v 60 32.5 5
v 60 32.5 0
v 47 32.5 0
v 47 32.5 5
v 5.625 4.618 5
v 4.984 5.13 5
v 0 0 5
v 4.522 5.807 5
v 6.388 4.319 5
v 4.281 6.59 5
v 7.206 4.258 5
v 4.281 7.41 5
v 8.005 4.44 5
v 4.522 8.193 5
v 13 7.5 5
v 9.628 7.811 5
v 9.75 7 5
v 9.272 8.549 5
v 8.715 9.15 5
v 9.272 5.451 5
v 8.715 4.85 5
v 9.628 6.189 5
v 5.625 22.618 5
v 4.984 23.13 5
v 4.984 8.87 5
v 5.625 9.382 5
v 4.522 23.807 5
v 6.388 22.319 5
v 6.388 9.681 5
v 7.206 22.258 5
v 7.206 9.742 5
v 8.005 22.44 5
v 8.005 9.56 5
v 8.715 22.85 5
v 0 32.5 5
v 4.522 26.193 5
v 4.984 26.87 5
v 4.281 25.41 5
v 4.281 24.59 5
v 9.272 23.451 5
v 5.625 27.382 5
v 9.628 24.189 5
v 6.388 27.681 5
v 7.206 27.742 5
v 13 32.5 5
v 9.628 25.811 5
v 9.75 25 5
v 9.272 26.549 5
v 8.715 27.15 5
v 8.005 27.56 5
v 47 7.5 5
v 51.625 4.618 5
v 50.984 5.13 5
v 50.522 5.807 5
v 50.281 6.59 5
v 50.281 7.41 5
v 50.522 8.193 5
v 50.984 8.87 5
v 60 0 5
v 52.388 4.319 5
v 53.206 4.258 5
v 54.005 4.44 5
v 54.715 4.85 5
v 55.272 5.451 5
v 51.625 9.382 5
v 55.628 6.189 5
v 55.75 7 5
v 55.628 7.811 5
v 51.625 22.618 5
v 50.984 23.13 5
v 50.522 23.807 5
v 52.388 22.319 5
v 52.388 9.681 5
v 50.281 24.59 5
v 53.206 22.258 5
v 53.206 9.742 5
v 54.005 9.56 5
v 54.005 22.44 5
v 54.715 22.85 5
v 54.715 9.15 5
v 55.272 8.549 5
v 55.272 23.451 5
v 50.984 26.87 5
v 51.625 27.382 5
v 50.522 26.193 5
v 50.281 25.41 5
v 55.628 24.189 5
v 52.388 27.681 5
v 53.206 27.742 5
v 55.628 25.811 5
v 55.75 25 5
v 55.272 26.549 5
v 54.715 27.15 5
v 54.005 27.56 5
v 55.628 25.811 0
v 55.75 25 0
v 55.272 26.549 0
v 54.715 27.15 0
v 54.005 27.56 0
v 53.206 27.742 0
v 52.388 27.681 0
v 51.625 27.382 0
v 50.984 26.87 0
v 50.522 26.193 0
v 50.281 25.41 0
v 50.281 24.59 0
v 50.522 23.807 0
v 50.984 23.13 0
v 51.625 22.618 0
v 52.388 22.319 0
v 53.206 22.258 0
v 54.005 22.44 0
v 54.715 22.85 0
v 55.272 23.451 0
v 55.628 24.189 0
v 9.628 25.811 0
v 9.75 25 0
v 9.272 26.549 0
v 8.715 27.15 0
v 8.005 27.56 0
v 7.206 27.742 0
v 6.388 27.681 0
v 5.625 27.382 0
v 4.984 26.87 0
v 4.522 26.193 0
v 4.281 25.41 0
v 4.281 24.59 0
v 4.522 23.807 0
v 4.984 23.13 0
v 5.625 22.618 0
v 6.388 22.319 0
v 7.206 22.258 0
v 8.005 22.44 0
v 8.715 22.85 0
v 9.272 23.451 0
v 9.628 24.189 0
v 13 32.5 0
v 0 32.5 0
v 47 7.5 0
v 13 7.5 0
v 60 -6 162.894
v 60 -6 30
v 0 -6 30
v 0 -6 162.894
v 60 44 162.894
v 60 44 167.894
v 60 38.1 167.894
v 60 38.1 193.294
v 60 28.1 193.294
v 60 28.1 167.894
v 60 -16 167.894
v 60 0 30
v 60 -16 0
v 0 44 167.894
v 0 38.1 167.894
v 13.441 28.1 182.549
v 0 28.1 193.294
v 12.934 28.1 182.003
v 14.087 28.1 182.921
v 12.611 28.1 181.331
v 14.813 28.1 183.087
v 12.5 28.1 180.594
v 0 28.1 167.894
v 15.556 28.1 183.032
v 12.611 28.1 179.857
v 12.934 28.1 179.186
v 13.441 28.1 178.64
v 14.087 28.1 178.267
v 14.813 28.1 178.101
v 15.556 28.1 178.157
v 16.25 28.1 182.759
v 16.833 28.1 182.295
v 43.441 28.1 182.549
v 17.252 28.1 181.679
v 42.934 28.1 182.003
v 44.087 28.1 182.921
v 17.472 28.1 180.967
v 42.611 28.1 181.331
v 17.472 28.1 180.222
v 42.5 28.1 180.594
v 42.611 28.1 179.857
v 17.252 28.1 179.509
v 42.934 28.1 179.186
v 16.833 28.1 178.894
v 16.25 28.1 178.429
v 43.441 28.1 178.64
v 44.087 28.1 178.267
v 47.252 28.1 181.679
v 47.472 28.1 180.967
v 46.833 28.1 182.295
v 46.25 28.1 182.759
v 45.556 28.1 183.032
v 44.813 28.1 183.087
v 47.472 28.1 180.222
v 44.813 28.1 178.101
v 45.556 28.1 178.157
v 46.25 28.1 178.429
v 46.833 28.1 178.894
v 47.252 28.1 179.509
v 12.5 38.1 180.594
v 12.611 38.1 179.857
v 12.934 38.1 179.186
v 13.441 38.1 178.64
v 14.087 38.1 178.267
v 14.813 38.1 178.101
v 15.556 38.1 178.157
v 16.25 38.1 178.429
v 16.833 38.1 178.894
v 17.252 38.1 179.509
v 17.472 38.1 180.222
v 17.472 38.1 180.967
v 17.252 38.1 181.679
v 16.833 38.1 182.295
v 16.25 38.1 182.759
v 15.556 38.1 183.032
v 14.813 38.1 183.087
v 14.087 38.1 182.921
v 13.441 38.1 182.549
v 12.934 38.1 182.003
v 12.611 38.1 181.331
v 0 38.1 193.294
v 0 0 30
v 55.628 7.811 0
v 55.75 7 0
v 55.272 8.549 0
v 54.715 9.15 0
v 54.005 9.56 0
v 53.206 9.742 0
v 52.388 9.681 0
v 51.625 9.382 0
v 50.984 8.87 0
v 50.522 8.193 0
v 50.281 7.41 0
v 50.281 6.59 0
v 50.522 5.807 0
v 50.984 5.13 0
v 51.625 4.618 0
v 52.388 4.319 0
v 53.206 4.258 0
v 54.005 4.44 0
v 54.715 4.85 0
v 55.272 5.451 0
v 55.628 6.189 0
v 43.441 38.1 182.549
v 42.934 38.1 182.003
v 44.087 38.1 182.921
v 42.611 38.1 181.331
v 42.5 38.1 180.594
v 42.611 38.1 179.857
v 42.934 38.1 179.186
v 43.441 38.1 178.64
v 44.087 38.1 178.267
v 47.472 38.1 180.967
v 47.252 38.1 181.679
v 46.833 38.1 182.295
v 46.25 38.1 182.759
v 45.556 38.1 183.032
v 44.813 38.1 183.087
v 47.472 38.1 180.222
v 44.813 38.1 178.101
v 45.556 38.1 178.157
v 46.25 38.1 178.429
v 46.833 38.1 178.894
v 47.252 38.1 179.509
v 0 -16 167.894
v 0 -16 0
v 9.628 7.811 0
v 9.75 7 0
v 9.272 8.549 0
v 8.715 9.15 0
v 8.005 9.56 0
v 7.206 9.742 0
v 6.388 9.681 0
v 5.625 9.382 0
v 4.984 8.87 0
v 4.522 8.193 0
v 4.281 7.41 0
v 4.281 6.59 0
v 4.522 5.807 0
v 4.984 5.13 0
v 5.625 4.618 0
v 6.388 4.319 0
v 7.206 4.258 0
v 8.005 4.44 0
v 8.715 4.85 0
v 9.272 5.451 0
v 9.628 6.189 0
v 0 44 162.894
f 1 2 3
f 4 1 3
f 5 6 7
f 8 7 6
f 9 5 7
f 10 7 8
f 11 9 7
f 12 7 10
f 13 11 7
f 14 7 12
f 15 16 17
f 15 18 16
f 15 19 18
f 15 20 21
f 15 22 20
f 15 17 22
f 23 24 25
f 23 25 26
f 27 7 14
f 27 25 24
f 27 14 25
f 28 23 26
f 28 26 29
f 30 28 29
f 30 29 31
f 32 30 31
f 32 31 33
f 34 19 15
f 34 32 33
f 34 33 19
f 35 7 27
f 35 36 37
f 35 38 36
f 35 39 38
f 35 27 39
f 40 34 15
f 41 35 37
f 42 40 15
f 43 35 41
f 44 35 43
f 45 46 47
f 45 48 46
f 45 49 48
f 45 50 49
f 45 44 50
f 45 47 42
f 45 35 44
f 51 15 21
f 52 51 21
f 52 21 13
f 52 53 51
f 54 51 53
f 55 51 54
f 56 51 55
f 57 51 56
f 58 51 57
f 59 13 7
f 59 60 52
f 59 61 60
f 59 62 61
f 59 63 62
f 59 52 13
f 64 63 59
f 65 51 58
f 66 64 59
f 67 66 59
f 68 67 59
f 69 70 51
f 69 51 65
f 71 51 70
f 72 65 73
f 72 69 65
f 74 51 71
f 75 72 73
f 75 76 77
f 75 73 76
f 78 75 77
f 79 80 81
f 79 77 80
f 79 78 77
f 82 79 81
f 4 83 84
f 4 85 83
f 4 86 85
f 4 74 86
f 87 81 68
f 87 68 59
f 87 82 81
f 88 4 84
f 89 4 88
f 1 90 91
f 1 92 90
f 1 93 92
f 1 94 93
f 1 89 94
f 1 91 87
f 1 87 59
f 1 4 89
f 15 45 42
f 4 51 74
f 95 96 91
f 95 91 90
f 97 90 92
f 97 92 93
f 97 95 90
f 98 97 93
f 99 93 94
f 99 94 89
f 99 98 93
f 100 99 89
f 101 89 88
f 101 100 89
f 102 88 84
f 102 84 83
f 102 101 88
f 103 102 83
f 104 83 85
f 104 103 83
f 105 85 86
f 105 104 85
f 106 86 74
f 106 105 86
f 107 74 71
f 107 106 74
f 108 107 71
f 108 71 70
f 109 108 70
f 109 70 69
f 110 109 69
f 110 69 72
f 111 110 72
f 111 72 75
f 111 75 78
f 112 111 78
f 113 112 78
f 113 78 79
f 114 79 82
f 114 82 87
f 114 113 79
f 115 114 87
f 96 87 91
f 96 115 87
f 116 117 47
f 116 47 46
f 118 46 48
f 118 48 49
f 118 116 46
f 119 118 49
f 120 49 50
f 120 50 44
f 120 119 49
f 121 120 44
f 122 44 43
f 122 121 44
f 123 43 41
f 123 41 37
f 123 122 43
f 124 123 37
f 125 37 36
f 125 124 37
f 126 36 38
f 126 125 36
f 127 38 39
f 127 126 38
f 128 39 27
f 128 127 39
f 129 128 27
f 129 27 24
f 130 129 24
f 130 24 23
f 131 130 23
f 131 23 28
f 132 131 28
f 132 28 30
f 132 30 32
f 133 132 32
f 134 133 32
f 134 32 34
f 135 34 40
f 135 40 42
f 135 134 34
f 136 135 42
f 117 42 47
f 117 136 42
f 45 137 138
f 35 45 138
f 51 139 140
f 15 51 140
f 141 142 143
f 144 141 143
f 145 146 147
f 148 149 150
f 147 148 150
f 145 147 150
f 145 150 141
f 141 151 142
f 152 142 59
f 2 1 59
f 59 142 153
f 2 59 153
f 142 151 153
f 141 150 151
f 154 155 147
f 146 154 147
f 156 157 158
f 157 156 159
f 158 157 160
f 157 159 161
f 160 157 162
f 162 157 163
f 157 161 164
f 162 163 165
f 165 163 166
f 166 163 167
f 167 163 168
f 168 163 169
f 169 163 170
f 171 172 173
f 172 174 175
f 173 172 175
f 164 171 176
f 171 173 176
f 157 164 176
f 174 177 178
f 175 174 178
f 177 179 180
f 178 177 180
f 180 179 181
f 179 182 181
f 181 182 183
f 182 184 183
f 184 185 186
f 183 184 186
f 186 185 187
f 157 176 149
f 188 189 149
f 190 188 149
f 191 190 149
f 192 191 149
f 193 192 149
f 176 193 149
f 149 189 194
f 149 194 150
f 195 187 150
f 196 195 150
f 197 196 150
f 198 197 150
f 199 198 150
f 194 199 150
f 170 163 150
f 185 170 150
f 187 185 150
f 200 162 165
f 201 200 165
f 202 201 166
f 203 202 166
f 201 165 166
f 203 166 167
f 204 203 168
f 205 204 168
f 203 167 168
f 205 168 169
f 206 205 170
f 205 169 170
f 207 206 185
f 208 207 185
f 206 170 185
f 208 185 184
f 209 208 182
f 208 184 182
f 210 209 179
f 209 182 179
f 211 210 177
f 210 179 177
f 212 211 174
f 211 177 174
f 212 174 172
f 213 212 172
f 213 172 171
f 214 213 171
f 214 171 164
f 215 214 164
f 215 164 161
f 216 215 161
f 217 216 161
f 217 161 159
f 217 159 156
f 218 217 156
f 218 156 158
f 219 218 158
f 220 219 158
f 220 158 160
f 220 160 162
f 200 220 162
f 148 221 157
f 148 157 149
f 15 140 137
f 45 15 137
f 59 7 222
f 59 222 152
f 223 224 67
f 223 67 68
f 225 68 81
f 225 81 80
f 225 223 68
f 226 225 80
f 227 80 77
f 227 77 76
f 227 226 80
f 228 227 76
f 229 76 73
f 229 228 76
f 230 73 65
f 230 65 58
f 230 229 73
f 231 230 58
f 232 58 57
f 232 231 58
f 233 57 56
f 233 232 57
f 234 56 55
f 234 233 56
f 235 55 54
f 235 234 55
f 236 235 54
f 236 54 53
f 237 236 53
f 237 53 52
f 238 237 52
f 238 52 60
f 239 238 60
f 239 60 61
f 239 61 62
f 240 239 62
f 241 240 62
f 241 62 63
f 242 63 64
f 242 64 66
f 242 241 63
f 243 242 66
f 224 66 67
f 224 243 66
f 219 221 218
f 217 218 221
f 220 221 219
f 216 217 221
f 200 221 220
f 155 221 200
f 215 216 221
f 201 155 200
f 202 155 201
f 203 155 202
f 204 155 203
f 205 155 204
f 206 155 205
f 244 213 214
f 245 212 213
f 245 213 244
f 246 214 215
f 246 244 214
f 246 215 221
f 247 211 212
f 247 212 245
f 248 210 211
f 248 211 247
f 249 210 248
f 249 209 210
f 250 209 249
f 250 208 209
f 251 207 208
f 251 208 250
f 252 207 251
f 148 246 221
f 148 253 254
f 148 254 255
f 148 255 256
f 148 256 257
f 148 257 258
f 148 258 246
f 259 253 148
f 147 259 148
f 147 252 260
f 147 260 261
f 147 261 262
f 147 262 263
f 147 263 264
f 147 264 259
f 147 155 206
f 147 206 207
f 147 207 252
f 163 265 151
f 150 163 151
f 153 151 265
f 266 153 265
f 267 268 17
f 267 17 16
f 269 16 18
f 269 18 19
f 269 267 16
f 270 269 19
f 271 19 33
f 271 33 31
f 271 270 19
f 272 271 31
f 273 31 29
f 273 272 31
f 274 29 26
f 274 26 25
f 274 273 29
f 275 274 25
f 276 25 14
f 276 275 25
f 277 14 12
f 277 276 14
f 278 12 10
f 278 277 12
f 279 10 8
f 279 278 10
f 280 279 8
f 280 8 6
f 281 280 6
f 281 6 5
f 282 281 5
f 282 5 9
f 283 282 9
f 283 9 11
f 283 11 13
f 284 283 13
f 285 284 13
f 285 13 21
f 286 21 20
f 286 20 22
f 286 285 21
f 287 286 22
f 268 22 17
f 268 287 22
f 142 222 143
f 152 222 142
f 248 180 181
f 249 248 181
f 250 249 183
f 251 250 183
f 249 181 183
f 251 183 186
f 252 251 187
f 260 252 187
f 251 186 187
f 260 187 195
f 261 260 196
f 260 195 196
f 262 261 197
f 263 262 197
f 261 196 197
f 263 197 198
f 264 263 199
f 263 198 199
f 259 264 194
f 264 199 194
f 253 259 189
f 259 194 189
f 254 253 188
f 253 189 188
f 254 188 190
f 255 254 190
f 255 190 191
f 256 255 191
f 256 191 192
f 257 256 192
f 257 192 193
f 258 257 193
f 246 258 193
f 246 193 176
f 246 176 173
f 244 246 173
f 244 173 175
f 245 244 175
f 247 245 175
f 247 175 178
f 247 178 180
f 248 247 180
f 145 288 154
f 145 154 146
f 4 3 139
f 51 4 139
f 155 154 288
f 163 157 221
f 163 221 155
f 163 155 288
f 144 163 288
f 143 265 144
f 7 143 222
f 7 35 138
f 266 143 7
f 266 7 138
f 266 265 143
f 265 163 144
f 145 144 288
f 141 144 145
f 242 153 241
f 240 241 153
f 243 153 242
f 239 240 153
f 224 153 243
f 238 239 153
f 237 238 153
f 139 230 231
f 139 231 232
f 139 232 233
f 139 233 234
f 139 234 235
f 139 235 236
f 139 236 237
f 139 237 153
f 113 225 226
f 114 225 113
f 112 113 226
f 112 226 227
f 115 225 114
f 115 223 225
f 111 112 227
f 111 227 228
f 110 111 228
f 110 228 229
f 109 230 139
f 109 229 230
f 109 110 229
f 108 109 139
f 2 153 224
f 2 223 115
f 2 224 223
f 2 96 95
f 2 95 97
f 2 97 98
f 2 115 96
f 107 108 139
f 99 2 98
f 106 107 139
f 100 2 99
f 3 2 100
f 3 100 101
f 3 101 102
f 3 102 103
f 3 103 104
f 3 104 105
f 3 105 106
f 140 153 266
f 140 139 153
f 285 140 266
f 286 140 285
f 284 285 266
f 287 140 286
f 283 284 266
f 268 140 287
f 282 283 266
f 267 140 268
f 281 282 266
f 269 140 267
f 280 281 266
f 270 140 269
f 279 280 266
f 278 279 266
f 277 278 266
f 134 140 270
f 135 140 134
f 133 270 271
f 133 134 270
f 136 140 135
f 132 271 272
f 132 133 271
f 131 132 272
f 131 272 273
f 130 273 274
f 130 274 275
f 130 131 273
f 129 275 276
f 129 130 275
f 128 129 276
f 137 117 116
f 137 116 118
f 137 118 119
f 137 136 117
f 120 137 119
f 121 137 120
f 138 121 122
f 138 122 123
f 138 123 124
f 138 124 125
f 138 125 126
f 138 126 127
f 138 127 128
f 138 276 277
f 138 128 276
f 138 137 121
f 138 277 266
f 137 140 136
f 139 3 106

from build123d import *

# Parameters (mm, degrees)
SKETCH1_R                = 2.75
BOSS_EXTRUDE1_DEPTH      = 5
BOSS_EXTRUDE2_DEPTH      = 25
BOSS_EXTRUDE2_DEPTH_BACK = 5
SKETCH2_W                = 60
SKETCH2_H                = 6
SKETCH3_W                = 60
SKETCH3_H                = 10
BOSS_EXTRUDE3_DEPTH      = 167.8942
SKETCH4_W                = 60
SKETCH4_H                = 5
BOSS_EXTRUDE4_DEPTH      = 50
SKETCH5_W                = 60
SKETCH5_H                = 10
BOSS_EXTRUDE5_DEPTH      = 25.4
M5X0_8_TAPPED_HOLE1_D    = 5


with BuildPart() as part:
    # Sketch1 → Boss-Extrude1 (new body)
    # profile 1 of 2: a face of its own
    with BuildSketch(Plane.XY):
        Polygon((13, 7.5), (13, 32.5), (0, 32.5), (0, 0), (30, 0), (30, 7.5), align=None)
        with Locations((7, 7)):
            Circle(SKETCH1_R, mode=Mode.SUBTRACT)
        with Locations((7, 25)):
            Circle(SKETCH1_R, mode=Mode.SUBTRACT)
    # profile 2 of 2: a face of its own
    with BuildSketch(Plane.XY):
        Polygon((47, 7.5), (30, 7.5), (30, 0), (60, 0), (60, 32.5), (47, 32.5), align=None)
        with Locations((53, 7)):
            Circle(SKETCH1_R, mode=Mode.SUBTRACT)
        with Locations((53, 25)):
            Circle(SKETCH1_R, mode=Mode.SUBTRACT)
    extrude(amount=BOSS_EXTRUDE1_DEPTH)

    # Sketch2 → Boss-Extrude2 (add, two sides: drawn at the far end of the back side and taken through both)
    with BuildSketch(Plane.XY.offset(5).offset(-BOSS_EXTRUDE2_DEPTH_BACK)):
        with Locations((30, -3)):
            Rectangle(SKETCH2_W, SKETCH2_H)
    extrude(amount=BOSS_EXTRUDE2_DEPTH + BOSS_EXTRUDE2_DEPTH_BACK)

    # Sketch3 → Boss-Extrude3 (add)
    with BuildSketch(Plane(origin=(0, 0, 0), x_dir=(-1, 0, 0), z_dir=(0, 0, -1))):
        with Locations((-30, -11)):
            Rectangle(SKETCH3_W, SKETCH3_H)
    extrude(amount=-BOSS_EXTRUDE3_DEPTH)

    # Sketch4 → Boss-Extrude4 (add)
    with BuildSketch(Plane(origin=(0, -6, 0), x_dir=(1, 0, 0), z_dir=(0, 1, 0))):
        with Locations((30, -165.3942)):
            Rectangle(SKETCH4_W, SKETCH4_H)
    extrude(amount=BOSS_EXTRUDE4_DEPTH)

    # Sketch5 → Boss-Extrude5 (add)
    with BuildSketch(Plane.XY.offset(167.8942)):
        with Locations((30, 33.0996)):
            Rectangle(SKETCH5_W, SKETCH5_H)
    extrude(amount=BOSS_EXTRUDE5_DEPTH)

    # M5x0.8 Tapped Hole1 (through all)
    with Locations(Plane(origin=(0, 38.0996, 0), x_dir=(1, 0, 0), z_dir=(0, 1, 0))):
        with Locations((45, -180.5942), (15, -180.5942)):
            Hole(M5X0_8_TAPPED_HOLE1_D / 2)


solid = part.part
